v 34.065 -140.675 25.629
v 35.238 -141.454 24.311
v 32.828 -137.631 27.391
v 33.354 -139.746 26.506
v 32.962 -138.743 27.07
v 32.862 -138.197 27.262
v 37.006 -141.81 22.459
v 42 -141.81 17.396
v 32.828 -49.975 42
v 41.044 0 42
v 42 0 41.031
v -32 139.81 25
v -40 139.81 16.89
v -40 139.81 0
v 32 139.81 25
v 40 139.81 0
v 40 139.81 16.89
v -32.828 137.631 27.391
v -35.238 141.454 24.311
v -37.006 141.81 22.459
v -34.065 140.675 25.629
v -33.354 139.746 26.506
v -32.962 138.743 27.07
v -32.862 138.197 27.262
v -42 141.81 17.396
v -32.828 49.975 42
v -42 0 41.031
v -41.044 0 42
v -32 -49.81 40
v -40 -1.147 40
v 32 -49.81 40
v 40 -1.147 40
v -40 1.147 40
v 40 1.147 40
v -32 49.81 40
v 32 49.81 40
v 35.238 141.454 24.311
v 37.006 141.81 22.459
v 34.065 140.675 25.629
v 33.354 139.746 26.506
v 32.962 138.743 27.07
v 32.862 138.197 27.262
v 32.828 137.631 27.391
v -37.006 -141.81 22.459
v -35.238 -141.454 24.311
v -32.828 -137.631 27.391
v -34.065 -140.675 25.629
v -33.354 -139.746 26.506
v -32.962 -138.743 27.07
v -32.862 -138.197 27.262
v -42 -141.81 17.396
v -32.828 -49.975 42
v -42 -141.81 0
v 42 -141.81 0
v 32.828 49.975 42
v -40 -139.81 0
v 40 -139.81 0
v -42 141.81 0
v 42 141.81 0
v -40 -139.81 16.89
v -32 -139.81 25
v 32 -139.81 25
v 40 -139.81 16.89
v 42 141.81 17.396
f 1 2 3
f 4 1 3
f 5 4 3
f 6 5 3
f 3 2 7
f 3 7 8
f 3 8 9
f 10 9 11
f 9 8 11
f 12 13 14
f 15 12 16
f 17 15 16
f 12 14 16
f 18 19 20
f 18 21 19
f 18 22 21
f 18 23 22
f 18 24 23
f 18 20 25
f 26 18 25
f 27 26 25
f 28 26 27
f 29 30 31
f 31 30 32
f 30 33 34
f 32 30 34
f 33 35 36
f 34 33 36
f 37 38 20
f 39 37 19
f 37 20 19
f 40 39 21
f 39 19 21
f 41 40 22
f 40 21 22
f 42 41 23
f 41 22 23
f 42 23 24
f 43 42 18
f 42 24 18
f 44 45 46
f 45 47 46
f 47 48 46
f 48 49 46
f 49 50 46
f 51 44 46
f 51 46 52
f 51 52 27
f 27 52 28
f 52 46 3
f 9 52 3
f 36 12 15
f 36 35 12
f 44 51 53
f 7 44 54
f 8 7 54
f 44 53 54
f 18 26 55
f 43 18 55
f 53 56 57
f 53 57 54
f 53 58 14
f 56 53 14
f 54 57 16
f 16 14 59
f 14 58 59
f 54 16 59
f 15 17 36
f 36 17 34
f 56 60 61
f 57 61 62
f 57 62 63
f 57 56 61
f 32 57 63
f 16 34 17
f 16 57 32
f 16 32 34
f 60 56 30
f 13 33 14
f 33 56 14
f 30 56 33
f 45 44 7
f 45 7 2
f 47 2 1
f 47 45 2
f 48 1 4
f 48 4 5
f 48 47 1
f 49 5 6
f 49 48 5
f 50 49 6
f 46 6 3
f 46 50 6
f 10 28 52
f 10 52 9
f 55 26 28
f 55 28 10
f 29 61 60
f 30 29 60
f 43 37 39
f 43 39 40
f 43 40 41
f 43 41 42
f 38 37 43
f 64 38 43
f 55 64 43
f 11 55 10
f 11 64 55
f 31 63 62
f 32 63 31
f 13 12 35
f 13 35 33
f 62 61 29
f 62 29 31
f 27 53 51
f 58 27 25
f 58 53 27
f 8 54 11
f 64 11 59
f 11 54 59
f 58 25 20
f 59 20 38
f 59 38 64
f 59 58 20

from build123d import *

# Parameters (mm, degrees)
F0_W        = 80
F0_H        = 279.619
F1_DEPTH    = 40
F2_SIZE2    = 90
F2_SIZE     = 15
F2_2_SIZE2  = 90
F2_2_SIZE   = 15
F3_SIZE     = 8
F4_T        = 2
F5_T1_DEPTH = 86.8350314591


# Not quite as in the source:
# - a fillet or chamfer that OpenCascade refuses, or shapes differently, is made with other operations: its cross-section is extruded or revolved along the edge and cut away or added


with BuildPart() as f1:
    # F0 (on Top) → F1 (new body)
    with BuildSketch(Plane.XY):
        Rectangle(F0_W, F0_H)
    extrude(amount=F1_DEPTH)

    # F2
    f2_edges = [f1.edges().sort_by_distance(p)[0] for p in [
        (0, 139.8095, 40),
    ]]
    f2_side = f1.faces().sort_by_distance((0, 139.8095, 20))[0]
    chamfer(f2_edges, length=F2_SIZE, length2=F2_SIZE2, reference=f2_side)

    # F2#2
    f2_2_edges = [f1.edges().sort_by_distance(p)[0] for p in [
        (0, -139.8095, 40),
    ]]
    f2_2_side = f1.faces().sort_by_distance((0, -139.8095, 20))[0]
    chamfer(f2_2_edges, length=F2_2_SIZE, length2=F2_2_SIZE2, reference=f2_2_side)

    # F3
    f3_edges = [f1.edges().sort_by_distance(p)[0] for p in [
        (-40, -94.8095, 32.5),
        (40, -94.8095, 32.5),
        (40, 94.8095, 32.5),
        (-40, 94.8095, 32.5),
    ]]
    chamfer(f3_edges, length=F3_SIZE)

    # F4
    f4_openings = [f1.faces().sort_by_distance(p)[0] for p in [
        (0, 0, 0),
    ]]
    offset(amount=F4_T, openings=f4_openings, kind=Kind.INTERSECTION)

    # F5: fillet of radius 5 on 2 edges, made by hand

    # F5_s2 → F5_t1 (cut)
    with BuildSketch(Plane.YZ.offset(-43.4175157295)):
        with BuildLine():
            ThreePointArc((-141.8095, 22.4586187349), (-140.6245999124, 25.6904932155), (-137.6314949365, 27.390588354))
            Line((-137.6314949365, 27.390588354), (-141.8095, 26.6942541768))
            Line((-141.8095, 26.6942541768), (-141.8095, 22.4586187349))
        make_face()
        with BuildLine():
            ThreePointArc((141.8095, 22.4586187349), (140.6245999124, 25.6904932155), (137.6314949365, 27.390588354))
            Line((137.6314949365, 27.390588354), (141.8095, 26.6942541768))
            Line((141.8095, 26.6942541768), (141.8095, 22.4586187349))
        make_face()
    extrude(amount=F5_T1_DEPTH, mode=Mode.SUBTRACT)


solid = f1.part
